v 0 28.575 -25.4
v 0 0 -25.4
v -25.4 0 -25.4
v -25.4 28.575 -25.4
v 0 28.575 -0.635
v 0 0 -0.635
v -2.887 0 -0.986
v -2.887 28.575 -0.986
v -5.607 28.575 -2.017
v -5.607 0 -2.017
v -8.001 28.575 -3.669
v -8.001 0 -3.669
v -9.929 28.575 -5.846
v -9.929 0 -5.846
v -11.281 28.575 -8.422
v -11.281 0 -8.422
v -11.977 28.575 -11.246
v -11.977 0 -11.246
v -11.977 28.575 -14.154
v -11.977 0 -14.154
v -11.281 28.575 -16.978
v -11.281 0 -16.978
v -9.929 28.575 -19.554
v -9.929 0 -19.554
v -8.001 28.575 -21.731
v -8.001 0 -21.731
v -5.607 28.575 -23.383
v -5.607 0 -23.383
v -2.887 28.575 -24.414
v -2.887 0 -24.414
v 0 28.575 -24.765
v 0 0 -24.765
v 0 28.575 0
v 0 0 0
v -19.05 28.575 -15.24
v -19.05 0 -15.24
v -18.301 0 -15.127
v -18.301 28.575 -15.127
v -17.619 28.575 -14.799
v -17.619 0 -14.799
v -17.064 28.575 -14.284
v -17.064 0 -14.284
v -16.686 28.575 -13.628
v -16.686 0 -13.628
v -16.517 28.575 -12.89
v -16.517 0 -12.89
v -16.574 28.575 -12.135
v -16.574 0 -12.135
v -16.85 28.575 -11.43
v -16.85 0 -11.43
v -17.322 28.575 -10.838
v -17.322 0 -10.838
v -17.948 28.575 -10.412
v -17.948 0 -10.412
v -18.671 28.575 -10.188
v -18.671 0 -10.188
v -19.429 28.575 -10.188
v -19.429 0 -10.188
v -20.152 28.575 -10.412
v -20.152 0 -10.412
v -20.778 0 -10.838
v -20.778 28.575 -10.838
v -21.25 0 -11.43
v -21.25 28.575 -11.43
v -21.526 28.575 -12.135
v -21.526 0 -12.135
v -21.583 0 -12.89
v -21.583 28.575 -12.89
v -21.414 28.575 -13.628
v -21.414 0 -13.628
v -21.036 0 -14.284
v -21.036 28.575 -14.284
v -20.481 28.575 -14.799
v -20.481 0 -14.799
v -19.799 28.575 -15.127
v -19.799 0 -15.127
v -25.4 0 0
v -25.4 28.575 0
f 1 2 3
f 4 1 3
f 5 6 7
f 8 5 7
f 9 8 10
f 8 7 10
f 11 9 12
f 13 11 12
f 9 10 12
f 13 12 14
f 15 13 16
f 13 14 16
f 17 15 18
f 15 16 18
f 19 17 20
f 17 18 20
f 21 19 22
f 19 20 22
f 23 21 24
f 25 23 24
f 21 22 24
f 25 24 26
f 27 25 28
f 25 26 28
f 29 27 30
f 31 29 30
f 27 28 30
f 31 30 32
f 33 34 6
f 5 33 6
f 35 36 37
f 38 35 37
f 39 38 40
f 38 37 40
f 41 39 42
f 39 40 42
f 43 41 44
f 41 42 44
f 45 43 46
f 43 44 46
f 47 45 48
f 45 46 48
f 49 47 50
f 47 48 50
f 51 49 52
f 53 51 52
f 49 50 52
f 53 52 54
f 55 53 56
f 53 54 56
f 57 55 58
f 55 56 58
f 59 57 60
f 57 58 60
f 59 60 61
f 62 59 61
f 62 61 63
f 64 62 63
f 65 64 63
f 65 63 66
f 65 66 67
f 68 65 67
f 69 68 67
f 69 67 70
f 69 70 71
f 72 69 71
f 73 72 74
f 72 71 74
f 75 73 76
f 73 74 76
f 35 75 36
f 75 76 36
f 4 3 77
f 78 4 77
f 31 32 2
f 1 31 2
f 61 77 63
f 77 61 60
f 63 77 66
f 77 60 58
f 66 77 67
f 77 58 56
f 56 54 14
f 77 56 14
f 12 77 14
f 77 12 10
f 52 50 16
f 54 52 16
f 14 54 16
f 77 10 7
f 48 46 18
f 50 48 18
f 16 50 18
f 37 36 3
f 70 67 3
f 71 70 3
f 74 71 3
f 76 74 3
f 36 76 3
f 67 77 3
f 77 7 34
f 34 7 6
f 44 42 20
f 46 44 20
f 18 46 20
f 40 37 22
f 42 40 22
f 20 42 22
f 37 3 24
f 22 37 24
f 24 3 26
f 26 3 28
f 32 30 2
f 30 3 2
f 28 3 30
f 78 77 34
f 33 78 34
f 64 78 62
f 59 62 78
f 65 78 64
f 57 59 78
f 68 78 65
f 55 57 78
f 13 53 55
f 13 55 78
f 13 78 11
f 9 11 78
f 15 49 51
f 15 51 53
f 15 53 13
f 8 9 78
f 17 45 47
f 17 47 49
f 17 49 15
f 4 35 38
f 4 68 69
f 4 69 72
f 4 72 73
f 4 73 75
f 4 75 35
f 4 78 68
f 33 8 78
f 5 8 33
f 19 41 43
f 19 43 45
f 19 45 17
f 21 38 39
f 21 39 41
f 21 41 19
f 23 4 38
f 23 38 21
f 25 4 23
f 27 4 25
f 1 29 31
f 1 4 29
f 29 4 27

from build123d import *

# Parameters (mm, degrees)
BOSS_EXTRUDE1_DEPTH = 28.575
SKETCH6_R           = 2.54
CUT_EXTRUDE4_DEPTH  = 28.575


with BuildPart() as part:
    # Sketch3 → Boss-Extrude1 (new body)
    with BuildSketch(Plane(origin=(0, 0, 0), x_dir=(1, 0, 0), z_dir=(0, 1, 0))):
        with BuildLine():
            Line((0, 0), (0, 0.635))
            ThreePointArc((0, 0.635), (-12.065, 12.7), (0, 24.765))
            Line((0, 24.765), (0, 25.4))
            Line((0, 25.4), (-25.4, 25.4))
            Line((-25.4, 25.4), (-25.4, 0))
            Line((-25.4, 0), (0, 0))
        make_face()
    extrude(amount=BOSS_EXTRUDE1_DEPTH)

    # Sketch6 → Cut-Extrude4 (cut)
    with BuildSketch(Plane(origin=(0, 0, 0), x_dir=(-1, 0, 0), z_dir=(0, -1, 0))):
        with Locations(Location((19.05, 12.7, 0), (0, 0, 90))):
            Circle(SKETCH6_R)
    extrude(amount=-CUT_EXTRUDE4_DEPTH, mode=Mode.SUBTRACT)


solid = part.part
